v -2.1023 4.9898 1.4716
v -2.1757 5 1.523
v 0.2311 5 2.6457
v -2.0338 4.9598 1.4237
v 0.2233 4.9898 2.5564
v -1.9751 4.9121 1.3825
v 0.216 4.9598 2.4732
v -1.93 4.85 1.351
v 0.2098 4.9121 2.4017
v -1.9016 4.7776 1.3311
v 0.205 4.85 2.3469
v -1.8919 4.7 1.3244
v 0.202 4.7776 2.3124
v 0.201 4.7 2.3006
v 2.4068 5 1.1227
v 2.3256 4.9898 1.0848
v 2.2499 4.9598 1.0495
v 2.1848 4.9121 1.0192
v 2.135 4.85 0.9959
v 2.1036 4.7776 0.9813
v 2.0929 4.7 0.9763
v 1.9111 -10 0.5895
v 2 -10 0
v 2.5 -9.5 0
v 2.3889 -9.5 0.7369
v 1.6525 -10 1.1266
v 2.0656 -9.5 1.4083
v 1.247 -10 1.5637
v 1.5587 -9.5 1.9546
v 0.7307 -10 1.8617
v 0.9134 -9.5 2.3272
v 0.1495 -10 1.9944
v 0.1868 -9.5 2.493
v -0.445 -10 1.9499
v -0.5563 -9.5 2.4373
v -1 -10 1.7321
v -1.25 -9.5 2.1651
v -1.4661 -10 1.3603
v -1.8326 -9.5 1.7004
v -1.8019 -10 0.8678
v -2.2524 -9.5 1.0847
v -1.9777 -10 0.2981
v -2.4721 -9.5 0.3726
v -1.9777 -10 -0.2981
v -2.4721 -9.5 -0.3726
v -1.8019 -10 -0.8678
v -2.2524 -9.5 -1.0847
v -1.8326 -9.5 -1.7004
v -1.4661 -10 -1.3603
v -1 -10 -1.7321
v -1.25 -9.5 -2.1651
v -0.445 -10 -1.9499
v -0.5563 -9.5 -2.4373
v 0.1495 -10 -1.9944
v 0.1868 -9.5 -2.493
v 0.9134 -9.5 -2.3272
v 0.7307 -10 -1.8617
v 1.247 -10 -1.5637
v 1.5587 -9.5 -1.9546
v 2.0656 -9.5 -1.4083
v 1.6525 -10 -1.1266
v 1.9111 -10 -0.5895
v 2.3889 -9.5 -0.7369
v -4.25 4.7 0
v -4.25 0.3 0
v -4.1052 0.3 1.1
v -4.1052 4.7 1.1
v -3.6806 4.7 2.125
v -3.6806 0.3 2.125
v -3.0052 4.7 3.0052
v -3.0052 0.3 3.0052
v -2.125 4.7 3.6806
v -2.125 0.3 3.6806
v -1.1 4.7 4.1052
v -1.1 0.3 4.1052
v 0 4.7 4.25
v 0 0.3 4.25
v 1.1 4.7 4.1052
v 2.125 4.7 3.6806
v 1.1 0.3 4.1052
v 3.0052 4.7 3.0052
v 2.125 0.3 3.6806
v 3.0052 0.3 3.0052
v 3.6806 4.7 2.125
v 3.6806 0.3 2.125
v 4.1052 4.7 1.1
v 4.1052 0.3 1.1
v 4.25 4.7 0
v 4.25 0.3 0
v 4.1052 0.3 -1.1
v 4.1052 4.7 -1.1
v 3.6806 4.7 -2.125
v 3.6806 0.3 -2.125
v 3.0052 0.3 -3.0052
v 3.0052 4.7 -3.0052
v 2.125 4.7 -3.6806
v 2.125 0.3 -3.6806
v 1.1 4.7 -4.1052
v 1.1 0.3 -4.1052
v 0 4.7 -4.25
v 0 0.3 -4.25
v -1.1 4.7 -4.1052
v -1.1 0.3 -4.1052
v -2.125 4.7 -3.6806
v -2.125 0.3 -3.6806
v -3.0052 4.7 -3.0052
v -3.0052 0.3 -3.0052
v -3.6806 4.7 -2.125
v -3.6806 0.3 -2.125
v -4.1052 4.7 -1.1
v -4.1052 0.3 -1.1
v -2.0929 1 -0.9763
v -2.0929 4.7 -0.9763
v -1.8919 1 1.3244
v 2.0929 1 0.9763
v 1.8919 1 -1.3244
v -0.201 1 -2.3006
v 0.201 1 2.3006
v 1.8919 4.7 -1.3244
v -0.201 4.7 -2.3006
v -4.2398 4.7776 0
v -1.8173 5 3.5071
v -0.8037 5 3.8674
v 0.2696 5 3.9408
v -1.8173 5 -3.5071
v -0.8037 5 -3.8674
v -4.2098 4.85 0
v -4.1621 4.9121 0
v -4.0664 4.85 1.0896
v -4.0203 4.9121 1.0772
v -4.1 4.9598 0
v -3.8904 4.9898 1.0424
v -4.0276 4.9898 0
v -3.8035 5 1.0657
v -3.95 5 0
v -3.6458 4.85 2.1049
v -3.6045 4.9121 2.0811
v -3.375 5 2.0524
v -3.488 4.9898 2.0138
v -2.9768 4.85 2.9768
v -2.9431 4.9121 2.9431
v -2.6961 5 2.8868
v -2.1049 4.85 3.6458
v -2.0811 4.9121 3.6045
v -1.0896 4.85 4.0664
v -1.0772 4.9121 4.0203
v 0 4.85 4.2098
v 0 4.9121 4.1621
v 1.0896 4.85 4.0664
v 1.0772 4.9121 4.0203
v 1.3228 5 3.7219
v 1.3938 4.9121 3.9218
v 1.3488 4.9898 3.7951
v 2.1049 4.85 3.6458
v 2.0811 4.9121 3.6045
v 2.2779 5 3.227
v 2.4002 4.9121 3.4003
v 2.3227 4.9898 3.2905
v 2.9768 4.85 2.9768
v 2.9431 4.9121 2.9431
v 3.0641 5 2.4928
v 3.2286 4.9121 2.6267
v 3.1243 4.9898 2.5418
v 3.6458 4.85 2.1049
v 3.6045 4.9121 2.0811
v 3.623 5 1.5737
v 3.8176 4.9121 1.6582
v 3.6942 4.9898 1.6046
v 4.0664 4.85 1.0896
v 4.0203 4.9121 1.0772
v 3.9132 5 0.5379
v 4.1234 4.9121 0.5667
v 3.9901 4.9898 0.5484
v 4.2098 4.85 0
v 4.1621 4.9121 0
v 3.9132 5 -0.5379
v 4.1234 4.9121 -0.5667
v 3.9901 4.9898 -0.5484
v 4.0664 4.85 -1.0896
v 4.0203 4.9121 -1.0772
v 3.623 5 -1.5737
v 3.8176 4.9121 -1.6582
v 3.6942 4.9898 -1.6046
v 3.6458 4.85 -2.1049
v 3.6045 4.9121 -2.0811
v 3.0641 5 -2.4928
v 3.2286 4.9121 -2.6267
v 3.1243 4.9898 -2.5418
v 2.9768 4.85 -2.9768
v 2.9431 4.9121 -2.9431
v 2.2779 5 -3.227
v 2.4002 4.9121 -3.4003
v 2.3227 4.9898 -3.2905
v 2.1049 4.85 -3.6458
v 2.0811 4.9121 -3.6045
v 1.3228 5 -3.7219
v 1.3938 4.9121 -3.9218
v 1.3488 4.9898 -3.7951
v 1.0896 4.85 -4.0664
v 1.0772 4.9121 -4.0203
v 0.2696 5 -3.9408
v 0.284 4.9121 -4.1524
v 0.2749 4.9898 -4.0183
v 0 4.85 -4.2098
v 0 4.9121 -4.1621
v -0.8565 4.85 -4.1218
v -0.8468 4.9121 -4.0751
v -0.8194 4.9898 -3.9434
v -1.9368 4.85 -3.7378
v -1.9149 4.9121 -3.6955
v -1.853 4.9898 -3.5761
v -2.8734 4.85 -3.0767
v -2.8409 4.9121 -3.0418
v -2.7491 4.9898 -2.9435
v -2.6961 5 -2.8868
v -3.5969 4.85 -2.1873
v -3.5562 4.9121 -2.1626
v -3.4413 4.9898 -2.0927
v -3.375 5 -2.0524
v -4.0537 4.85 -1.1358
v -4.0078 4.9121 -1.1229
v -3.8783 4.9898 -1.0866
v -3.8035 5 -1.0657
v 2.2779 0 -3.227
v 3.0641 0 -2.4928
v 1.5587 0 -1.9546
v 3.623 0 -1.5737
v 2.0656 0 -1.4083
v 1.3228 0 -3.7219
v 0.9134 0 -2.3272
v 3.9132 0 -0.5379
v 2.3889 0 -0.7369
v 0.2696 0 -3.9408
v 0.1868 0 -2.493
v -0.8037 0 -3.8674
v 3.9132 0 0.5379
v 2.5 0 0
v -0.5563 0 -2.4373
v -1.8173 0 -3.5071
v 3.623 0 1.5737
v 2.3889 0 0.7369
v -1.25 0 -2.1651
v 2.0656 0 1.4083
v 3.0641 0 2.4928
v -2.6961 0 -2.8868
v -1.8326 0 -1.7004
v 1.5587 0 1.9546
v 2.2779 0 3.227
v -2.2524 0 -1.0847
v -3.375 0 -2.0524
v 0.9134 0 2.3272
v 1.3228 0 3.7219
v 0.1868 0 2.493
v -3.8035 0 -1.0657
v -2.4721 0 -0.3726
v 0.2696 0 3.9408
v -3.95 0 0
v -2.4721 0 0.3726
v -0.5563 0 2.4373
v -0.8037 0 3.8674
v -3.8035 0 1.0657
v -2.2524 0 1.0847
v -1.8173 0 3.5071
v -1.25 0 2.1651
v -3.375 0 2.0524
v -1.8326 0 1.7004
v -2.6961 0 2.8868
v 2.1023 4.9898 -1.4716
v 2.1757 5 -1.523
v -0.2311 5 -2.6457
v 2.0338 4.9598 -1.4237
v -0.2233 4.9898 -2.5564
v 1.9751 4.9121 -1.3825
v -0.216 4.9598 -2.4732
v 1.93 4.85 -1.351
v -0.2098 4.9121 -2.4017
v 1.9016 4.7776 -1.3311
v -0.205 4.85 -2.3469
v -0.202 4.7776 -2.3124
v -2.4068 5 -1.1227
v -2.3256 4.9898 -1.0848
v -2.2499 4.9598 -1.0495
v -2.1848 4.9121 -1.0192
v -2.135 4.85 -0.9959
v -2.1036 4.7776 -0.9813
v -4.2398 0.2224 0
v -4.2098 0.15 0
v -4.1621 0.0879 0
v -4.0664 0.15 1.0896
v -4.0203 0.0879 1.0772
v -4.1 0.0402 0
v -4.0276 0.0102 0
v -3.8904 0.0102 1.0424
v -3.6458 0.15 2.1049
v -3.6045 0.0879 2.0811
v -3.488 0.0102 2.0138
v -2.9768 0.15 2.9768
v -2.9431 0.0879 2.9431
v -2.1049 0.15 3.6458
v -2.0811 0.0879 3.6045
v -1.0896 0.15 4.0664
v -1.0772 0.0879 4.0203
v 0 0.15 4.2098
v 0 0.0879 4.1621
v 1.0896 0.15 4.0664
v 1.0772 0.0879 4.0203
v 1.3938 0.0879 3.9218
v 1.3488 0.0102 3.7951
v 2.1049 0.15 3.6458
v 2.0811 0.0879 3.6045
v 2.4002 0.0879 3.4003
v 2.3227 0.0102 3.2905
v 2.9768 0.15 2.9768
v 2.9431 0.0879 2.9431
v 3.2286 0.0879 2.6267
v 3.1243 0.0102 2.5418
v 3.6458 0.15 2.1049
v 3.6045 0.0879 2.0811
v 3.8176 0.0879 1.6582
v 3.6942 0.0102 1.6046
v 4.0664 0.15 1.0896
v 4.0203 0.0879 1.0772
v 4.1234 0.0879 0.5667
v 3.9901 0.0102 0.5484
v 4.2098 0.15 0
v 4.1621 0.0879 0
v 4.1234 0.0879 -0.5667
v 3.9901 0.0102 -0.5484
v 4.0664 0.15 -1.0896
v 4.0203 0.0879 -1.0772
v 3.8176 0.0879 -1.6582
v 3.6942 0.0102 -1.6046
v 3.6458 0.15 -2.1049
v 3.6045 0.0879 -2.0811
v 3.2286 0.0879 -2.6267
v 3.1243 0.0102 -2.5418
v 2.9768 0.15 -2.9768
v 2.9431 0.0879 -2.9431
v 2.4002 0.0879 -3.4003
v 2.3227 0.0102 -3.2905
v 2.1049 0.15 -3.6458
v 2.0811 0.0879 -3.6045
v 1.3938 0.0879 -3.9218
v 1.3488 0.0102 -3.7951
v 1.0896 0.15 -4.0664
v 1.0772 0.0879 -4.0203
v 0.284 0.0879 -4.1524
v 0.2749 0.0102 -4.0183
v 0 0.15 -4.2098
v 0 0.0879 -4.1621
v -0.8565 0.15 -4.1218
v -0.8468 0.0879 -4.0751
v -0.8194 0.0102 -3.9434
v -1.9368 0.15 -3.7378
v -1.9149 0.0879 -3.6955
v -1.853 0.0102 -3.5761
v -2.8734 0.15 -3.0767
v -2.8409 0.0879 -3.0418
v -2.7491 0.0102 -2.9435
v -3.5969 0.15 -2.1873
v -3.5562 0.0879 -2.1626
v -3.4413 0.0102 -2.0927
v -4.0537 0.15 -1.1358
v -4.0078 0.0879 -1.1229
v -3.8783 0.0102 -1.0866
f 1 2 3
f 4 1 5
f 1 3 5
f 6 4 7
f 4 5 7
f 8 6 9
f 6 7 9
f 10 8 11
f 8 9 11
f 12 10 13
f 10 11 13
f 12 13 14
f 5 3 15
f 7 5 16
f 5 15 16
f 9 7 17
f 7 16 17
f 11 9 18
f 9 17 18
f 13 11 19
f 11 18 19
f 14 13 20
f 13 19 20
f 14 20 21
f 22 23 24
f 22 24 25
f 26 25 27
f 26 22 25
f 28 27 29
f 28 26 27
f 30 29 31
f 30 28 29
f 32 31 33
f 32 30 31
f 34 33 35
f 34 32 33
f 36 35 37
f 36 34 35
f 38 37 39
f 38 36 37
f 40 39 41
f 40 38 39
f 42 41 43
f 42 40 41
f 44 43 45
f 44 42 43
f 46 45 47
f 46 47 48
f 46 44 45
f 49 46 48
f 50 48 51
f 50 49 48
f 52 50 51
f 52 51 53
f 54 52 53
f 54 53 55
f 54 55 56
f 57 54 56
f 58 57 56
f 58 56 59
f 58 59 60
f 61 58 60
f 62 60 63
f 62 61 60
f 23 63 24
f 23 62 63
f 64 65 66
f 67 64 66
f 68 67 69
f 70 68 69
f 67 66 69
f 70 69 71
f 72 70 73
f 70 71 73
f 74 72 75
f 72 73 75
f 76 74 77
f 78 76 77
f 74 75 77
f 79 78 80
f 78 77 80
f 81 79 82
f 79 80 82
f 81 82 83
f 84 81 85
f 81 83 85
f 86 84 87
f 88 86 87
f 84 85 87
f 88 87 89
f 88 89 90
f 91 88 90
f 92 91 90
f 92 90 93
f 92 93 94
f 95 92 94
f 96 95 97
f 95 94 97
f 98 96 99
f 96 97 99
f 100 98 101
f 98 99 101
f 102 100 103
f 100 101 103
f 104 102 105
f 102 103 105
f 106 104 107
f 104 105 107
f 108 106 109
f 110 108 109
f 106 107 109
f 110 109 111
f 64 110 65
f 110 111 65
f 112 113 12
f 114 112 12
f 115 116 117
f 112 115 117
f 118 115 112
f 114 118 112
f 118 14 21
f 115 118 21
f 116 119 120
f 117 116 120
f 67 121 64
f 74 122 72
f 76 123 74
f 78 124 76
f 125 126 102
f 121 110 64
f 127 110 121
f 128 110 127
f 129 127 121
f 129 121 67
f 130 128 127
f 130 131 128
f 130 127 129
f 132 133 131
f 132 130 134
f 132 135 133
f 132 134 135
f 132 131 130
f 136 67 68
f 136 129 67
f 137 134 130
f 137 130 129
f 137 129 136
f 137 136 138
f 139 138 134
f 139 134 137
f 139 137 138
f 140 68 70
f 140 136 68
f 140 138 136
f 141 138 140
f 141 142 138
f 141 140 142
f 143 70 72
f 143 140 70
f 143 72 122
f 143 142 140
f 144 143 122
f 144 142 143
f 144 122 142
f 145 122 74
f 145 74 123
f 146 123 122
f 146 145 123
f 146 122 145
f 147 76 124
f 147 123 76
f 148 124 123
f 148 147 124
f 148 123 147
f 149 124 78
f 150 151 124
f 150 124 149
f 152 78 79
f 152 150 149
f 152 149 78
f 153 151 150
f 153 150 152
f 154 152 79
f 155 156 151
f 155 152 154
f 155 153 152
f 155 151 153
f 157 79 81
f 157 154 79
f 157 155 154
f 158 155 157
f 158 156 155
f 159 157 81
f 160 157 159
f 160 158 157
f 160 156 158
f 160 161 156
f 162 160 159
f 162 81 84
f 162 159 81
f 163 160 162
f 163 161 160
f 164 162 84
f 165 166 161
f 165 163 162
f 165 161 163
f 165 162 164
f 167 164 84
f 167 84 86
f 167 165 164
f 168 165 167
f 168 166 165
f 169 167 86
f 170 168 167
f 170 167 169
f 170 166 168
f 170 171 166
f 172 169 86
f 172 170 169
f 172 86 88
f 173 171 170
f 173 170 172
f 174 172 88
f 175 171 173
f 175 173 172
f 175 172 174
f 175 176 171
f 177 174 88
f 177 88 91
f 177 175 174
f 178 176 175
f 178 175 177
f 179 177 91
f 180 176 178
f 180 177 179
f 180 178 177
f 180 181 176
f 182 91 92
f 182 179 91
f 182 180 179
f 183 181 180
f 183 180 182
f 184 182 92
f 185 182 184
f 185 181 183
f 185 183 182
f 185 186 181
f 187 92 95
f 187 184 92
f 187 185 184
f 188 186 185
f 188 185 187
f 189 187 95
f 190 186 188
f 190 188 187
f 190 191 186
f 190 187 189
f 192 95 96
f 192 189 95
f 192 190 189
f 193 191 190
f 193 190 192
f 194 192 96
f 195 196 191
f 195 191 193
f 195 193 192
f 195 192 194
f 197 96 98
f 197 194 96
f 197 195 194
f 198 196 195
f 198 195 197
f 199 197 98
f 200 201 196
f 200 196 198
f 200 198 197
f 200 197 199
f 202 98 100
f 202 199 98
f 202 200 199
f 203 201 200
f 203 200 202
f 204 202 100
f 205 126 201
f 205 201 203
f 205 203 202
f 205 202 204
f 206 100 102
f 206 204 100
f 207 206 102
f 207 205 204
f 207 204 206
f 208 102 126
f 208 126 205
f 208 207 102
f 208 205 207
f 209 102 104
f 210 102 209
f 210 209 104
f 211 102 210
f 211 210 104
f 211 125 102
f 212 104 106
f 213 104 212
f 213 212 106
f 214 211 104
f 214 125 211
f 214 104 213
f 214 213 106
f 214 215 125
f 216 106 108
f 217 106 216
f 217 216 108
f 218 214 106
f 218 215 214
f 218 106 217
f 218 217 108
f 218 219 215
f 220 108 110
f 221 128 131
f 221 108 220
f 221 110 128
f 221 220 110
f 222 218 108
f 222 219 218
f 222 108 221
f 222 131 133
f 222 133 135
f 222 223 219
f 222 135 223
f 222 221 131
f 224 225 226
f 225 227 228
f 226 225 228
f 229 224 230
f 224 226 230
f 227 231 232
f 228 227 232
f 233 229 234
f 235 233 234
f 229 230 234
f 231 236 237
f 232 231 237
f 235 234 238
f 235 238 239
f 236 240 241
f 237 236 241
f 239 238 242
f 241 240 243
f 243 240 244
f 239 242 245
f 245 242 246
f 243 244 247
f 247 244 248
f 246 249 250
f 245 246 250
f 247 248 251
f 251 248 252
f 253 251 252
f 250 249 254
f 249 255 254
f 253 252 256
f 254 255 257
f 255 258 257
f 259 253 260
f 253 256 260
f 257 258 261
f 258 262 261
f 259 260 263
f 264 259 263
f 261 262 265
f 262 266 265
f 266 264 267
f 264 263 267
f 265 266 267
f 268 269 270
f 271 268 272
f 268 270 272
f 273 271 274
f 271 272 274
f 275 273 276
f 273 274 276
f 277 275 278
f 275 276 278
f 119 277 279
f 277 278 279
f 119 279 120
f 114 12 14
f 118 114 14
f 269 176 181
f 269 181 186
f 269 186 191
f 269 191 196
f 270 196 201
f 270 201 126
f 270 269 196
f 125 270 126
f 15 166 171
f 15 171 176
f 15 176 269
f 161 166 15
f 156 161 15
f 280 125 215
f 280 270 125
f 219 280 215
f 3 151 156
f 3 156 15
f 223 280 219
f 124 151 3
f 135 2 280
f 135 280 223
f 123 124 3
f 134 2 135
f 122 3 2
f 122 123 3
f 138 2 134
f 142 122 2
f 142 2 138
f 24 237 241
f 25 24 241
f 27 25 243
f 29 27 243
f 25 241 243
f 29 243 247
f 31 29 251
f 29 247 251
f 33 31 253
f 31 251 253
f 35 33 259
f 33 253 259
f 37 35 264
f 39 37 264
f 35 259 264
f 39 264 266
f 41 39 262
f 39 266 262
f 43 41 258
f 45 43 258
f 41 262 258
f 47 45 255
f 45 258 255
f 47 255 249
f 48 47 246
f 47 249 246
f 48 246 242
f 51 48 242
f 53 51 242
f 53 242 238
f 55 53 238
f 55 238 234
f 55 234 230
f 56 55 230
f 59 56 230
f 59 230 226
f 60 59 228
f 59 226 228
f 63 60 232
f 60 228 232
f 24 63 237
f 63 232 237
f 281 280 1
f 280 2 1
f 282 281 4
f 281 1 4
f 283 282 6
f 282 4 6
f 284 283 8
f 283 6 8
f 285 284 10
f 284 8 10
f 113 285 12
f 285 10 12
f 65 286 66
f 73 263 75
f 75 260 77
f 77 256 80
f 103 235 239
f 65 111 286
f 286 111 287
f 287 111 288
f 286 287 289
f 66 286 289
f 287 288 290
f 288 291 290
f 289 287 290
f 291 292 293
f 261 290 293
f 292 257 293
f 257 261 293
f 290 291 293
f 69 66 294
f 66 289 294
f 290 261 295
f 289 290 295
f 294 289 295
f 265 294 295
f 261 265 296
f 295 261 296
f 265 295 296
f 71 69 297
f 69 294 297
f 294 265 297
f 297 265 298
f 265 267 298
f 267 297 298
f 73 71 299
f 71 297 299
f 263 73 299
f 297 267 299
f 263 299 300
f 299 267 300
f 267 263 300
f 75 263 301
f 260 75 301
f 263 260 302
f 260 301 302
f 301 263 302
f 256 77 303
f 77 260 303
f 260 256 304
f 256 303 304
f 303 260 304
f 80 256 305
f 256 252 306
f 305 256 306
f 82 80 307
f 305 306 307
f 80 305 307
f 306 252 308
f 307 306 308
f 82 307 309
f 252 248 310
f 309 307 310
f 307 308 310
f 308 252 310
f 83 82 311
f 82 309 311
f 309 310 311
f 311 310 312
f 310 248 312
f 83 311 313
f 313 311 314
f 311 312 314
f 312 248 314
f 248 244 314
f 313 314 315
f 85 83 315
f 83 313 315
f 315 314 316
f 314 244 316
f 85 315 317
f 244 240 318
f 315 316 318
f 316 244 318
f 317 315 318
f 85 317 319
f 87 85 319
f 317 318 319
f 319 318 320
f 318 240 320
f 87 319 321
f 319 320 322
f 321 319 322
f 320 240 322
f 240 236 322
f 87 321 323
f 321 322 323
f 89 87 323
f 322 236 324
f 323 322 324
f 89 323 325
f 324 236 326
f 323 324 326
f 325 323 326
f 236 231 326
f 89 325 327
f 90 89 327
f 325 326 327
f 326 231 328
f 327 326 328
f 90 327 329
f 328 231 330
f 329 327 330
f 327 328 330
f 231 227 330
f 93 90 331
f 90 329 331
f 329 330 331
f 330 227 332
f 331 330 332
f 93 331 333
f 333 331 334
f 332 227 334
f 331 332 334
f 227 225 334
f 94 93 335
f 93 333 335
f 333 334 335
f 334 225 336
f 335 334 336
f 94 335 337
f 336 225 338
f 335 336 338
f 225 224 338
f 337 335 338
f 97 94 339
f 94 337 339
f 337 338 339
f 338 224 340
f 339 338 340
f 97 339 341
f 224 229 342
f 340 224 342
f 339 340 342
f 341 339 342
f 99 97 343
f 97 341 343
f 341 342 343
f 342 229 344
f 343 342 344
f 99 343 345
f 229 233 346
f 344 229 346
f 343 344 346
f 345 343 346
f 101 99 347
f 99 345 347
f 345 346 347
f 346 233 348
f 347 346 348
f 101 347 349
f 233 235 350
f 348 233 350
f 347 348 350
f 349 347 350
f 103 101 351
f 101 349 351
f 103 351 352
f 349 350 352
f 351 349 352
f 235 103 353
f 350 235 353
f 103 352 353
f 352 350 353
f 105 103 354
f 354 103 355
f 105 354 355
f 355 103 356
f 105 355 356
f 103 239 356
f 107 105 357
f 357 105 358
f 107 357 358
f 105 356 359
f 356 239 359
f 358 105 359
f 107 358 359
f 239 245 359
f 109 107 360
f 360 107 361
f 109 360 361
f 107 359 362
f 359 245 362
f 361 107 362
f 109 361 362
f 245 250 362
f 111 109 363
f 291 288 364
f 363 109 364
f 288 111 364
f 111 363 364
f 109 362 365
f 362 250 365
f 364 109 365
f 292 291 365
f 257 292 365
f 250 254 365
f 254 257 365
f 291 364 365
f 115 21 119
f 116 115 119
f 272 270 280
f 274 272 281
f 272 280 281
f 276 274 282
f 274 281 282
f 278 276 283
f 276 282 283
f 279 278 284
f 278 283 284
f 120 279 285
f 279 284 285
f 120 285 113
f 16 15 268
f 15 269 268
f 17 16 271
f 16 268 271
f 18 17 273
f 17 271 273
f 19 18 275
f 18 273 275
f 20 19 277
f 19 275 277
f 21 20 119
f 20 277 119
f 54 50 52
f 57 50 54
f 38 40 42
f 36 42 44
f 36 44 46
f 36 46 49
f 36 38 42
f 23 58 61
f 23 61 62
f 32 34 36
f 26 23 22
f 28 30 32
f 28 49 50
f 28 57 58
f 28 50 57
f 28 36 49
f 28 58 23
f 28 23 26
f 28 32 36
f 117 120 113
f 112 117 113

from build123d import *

# Parameters (mm, degrees)
F0_R     = 2.5
F1_DEPTH = 10
F2_SIZE  = 0.5
F3_R     = 4.25
F3_R_2   = 2.5
F4_DEPTH = 5
F6_DEPTH = 4
F7_R     = 0.3


with BuildPart() as f1:
    # F0 (on Front) → F1 (new body)
    with BuildSketch(Plane.XZ):
        Circle(F0_R)
    extrude(amount=F1_DEPTH)

    # F2
    f2_edges = [f1.edges().sort_by_distance(p)[0] for p in [
        (-2.5, -10, 0),
    ]]
    chamfer(f2_edges, length=F2_SIZE)

    # F3 (on face) → F4 (join)
    with BuildSketch(Plane(origin=(0, 0, 0), x_dir=(-1, 0, 0), z_dir=(0, 1, 0))):
        Circle(F3_R)
        Circle(F3_R_2, mode=Mode.SUBTRACT)
        Circle(F3_R_2)
    extrude(amount=F4_DEPTH)

    # F5 (on face) → F6 (cut)
    with BuildSketch(Plane(origin=(0, 5, 0), x_dir=(-1, 0, 0), z_dir=(0, 1, 0))):
        Polygon((-0.2009555222, 2.3006412609), (-2.092891538, 0.9762880432), (-1.8919360159, -1.3243532177), (0.2009555222, -2.3006412609), (2.092891538, -0.9762880432), (1.8919360159, 1.3243532177), align=None)
    extrude(amount=-F6_DEPTH, mode=Mode.SUBTRACT)

    # F7
    f7_edges = [f1.edges().sort_by_distance(p)[0] for p in [
        (4.25, 5, 0),
        (4.25, 0, 0),
        (1.146924, 5, 1.638465),
        (-0.84549, 5, 1.812497),
        (1.992414, 5, -0.174033),
        (0.84549, 5, -1.812497),
        (-1.146924, 5, -1.638465),
        (-1.992414, 5, 0.174033),
    ]]
    fillet(f7_edges, radius=F7_R)


solid = f1.part
